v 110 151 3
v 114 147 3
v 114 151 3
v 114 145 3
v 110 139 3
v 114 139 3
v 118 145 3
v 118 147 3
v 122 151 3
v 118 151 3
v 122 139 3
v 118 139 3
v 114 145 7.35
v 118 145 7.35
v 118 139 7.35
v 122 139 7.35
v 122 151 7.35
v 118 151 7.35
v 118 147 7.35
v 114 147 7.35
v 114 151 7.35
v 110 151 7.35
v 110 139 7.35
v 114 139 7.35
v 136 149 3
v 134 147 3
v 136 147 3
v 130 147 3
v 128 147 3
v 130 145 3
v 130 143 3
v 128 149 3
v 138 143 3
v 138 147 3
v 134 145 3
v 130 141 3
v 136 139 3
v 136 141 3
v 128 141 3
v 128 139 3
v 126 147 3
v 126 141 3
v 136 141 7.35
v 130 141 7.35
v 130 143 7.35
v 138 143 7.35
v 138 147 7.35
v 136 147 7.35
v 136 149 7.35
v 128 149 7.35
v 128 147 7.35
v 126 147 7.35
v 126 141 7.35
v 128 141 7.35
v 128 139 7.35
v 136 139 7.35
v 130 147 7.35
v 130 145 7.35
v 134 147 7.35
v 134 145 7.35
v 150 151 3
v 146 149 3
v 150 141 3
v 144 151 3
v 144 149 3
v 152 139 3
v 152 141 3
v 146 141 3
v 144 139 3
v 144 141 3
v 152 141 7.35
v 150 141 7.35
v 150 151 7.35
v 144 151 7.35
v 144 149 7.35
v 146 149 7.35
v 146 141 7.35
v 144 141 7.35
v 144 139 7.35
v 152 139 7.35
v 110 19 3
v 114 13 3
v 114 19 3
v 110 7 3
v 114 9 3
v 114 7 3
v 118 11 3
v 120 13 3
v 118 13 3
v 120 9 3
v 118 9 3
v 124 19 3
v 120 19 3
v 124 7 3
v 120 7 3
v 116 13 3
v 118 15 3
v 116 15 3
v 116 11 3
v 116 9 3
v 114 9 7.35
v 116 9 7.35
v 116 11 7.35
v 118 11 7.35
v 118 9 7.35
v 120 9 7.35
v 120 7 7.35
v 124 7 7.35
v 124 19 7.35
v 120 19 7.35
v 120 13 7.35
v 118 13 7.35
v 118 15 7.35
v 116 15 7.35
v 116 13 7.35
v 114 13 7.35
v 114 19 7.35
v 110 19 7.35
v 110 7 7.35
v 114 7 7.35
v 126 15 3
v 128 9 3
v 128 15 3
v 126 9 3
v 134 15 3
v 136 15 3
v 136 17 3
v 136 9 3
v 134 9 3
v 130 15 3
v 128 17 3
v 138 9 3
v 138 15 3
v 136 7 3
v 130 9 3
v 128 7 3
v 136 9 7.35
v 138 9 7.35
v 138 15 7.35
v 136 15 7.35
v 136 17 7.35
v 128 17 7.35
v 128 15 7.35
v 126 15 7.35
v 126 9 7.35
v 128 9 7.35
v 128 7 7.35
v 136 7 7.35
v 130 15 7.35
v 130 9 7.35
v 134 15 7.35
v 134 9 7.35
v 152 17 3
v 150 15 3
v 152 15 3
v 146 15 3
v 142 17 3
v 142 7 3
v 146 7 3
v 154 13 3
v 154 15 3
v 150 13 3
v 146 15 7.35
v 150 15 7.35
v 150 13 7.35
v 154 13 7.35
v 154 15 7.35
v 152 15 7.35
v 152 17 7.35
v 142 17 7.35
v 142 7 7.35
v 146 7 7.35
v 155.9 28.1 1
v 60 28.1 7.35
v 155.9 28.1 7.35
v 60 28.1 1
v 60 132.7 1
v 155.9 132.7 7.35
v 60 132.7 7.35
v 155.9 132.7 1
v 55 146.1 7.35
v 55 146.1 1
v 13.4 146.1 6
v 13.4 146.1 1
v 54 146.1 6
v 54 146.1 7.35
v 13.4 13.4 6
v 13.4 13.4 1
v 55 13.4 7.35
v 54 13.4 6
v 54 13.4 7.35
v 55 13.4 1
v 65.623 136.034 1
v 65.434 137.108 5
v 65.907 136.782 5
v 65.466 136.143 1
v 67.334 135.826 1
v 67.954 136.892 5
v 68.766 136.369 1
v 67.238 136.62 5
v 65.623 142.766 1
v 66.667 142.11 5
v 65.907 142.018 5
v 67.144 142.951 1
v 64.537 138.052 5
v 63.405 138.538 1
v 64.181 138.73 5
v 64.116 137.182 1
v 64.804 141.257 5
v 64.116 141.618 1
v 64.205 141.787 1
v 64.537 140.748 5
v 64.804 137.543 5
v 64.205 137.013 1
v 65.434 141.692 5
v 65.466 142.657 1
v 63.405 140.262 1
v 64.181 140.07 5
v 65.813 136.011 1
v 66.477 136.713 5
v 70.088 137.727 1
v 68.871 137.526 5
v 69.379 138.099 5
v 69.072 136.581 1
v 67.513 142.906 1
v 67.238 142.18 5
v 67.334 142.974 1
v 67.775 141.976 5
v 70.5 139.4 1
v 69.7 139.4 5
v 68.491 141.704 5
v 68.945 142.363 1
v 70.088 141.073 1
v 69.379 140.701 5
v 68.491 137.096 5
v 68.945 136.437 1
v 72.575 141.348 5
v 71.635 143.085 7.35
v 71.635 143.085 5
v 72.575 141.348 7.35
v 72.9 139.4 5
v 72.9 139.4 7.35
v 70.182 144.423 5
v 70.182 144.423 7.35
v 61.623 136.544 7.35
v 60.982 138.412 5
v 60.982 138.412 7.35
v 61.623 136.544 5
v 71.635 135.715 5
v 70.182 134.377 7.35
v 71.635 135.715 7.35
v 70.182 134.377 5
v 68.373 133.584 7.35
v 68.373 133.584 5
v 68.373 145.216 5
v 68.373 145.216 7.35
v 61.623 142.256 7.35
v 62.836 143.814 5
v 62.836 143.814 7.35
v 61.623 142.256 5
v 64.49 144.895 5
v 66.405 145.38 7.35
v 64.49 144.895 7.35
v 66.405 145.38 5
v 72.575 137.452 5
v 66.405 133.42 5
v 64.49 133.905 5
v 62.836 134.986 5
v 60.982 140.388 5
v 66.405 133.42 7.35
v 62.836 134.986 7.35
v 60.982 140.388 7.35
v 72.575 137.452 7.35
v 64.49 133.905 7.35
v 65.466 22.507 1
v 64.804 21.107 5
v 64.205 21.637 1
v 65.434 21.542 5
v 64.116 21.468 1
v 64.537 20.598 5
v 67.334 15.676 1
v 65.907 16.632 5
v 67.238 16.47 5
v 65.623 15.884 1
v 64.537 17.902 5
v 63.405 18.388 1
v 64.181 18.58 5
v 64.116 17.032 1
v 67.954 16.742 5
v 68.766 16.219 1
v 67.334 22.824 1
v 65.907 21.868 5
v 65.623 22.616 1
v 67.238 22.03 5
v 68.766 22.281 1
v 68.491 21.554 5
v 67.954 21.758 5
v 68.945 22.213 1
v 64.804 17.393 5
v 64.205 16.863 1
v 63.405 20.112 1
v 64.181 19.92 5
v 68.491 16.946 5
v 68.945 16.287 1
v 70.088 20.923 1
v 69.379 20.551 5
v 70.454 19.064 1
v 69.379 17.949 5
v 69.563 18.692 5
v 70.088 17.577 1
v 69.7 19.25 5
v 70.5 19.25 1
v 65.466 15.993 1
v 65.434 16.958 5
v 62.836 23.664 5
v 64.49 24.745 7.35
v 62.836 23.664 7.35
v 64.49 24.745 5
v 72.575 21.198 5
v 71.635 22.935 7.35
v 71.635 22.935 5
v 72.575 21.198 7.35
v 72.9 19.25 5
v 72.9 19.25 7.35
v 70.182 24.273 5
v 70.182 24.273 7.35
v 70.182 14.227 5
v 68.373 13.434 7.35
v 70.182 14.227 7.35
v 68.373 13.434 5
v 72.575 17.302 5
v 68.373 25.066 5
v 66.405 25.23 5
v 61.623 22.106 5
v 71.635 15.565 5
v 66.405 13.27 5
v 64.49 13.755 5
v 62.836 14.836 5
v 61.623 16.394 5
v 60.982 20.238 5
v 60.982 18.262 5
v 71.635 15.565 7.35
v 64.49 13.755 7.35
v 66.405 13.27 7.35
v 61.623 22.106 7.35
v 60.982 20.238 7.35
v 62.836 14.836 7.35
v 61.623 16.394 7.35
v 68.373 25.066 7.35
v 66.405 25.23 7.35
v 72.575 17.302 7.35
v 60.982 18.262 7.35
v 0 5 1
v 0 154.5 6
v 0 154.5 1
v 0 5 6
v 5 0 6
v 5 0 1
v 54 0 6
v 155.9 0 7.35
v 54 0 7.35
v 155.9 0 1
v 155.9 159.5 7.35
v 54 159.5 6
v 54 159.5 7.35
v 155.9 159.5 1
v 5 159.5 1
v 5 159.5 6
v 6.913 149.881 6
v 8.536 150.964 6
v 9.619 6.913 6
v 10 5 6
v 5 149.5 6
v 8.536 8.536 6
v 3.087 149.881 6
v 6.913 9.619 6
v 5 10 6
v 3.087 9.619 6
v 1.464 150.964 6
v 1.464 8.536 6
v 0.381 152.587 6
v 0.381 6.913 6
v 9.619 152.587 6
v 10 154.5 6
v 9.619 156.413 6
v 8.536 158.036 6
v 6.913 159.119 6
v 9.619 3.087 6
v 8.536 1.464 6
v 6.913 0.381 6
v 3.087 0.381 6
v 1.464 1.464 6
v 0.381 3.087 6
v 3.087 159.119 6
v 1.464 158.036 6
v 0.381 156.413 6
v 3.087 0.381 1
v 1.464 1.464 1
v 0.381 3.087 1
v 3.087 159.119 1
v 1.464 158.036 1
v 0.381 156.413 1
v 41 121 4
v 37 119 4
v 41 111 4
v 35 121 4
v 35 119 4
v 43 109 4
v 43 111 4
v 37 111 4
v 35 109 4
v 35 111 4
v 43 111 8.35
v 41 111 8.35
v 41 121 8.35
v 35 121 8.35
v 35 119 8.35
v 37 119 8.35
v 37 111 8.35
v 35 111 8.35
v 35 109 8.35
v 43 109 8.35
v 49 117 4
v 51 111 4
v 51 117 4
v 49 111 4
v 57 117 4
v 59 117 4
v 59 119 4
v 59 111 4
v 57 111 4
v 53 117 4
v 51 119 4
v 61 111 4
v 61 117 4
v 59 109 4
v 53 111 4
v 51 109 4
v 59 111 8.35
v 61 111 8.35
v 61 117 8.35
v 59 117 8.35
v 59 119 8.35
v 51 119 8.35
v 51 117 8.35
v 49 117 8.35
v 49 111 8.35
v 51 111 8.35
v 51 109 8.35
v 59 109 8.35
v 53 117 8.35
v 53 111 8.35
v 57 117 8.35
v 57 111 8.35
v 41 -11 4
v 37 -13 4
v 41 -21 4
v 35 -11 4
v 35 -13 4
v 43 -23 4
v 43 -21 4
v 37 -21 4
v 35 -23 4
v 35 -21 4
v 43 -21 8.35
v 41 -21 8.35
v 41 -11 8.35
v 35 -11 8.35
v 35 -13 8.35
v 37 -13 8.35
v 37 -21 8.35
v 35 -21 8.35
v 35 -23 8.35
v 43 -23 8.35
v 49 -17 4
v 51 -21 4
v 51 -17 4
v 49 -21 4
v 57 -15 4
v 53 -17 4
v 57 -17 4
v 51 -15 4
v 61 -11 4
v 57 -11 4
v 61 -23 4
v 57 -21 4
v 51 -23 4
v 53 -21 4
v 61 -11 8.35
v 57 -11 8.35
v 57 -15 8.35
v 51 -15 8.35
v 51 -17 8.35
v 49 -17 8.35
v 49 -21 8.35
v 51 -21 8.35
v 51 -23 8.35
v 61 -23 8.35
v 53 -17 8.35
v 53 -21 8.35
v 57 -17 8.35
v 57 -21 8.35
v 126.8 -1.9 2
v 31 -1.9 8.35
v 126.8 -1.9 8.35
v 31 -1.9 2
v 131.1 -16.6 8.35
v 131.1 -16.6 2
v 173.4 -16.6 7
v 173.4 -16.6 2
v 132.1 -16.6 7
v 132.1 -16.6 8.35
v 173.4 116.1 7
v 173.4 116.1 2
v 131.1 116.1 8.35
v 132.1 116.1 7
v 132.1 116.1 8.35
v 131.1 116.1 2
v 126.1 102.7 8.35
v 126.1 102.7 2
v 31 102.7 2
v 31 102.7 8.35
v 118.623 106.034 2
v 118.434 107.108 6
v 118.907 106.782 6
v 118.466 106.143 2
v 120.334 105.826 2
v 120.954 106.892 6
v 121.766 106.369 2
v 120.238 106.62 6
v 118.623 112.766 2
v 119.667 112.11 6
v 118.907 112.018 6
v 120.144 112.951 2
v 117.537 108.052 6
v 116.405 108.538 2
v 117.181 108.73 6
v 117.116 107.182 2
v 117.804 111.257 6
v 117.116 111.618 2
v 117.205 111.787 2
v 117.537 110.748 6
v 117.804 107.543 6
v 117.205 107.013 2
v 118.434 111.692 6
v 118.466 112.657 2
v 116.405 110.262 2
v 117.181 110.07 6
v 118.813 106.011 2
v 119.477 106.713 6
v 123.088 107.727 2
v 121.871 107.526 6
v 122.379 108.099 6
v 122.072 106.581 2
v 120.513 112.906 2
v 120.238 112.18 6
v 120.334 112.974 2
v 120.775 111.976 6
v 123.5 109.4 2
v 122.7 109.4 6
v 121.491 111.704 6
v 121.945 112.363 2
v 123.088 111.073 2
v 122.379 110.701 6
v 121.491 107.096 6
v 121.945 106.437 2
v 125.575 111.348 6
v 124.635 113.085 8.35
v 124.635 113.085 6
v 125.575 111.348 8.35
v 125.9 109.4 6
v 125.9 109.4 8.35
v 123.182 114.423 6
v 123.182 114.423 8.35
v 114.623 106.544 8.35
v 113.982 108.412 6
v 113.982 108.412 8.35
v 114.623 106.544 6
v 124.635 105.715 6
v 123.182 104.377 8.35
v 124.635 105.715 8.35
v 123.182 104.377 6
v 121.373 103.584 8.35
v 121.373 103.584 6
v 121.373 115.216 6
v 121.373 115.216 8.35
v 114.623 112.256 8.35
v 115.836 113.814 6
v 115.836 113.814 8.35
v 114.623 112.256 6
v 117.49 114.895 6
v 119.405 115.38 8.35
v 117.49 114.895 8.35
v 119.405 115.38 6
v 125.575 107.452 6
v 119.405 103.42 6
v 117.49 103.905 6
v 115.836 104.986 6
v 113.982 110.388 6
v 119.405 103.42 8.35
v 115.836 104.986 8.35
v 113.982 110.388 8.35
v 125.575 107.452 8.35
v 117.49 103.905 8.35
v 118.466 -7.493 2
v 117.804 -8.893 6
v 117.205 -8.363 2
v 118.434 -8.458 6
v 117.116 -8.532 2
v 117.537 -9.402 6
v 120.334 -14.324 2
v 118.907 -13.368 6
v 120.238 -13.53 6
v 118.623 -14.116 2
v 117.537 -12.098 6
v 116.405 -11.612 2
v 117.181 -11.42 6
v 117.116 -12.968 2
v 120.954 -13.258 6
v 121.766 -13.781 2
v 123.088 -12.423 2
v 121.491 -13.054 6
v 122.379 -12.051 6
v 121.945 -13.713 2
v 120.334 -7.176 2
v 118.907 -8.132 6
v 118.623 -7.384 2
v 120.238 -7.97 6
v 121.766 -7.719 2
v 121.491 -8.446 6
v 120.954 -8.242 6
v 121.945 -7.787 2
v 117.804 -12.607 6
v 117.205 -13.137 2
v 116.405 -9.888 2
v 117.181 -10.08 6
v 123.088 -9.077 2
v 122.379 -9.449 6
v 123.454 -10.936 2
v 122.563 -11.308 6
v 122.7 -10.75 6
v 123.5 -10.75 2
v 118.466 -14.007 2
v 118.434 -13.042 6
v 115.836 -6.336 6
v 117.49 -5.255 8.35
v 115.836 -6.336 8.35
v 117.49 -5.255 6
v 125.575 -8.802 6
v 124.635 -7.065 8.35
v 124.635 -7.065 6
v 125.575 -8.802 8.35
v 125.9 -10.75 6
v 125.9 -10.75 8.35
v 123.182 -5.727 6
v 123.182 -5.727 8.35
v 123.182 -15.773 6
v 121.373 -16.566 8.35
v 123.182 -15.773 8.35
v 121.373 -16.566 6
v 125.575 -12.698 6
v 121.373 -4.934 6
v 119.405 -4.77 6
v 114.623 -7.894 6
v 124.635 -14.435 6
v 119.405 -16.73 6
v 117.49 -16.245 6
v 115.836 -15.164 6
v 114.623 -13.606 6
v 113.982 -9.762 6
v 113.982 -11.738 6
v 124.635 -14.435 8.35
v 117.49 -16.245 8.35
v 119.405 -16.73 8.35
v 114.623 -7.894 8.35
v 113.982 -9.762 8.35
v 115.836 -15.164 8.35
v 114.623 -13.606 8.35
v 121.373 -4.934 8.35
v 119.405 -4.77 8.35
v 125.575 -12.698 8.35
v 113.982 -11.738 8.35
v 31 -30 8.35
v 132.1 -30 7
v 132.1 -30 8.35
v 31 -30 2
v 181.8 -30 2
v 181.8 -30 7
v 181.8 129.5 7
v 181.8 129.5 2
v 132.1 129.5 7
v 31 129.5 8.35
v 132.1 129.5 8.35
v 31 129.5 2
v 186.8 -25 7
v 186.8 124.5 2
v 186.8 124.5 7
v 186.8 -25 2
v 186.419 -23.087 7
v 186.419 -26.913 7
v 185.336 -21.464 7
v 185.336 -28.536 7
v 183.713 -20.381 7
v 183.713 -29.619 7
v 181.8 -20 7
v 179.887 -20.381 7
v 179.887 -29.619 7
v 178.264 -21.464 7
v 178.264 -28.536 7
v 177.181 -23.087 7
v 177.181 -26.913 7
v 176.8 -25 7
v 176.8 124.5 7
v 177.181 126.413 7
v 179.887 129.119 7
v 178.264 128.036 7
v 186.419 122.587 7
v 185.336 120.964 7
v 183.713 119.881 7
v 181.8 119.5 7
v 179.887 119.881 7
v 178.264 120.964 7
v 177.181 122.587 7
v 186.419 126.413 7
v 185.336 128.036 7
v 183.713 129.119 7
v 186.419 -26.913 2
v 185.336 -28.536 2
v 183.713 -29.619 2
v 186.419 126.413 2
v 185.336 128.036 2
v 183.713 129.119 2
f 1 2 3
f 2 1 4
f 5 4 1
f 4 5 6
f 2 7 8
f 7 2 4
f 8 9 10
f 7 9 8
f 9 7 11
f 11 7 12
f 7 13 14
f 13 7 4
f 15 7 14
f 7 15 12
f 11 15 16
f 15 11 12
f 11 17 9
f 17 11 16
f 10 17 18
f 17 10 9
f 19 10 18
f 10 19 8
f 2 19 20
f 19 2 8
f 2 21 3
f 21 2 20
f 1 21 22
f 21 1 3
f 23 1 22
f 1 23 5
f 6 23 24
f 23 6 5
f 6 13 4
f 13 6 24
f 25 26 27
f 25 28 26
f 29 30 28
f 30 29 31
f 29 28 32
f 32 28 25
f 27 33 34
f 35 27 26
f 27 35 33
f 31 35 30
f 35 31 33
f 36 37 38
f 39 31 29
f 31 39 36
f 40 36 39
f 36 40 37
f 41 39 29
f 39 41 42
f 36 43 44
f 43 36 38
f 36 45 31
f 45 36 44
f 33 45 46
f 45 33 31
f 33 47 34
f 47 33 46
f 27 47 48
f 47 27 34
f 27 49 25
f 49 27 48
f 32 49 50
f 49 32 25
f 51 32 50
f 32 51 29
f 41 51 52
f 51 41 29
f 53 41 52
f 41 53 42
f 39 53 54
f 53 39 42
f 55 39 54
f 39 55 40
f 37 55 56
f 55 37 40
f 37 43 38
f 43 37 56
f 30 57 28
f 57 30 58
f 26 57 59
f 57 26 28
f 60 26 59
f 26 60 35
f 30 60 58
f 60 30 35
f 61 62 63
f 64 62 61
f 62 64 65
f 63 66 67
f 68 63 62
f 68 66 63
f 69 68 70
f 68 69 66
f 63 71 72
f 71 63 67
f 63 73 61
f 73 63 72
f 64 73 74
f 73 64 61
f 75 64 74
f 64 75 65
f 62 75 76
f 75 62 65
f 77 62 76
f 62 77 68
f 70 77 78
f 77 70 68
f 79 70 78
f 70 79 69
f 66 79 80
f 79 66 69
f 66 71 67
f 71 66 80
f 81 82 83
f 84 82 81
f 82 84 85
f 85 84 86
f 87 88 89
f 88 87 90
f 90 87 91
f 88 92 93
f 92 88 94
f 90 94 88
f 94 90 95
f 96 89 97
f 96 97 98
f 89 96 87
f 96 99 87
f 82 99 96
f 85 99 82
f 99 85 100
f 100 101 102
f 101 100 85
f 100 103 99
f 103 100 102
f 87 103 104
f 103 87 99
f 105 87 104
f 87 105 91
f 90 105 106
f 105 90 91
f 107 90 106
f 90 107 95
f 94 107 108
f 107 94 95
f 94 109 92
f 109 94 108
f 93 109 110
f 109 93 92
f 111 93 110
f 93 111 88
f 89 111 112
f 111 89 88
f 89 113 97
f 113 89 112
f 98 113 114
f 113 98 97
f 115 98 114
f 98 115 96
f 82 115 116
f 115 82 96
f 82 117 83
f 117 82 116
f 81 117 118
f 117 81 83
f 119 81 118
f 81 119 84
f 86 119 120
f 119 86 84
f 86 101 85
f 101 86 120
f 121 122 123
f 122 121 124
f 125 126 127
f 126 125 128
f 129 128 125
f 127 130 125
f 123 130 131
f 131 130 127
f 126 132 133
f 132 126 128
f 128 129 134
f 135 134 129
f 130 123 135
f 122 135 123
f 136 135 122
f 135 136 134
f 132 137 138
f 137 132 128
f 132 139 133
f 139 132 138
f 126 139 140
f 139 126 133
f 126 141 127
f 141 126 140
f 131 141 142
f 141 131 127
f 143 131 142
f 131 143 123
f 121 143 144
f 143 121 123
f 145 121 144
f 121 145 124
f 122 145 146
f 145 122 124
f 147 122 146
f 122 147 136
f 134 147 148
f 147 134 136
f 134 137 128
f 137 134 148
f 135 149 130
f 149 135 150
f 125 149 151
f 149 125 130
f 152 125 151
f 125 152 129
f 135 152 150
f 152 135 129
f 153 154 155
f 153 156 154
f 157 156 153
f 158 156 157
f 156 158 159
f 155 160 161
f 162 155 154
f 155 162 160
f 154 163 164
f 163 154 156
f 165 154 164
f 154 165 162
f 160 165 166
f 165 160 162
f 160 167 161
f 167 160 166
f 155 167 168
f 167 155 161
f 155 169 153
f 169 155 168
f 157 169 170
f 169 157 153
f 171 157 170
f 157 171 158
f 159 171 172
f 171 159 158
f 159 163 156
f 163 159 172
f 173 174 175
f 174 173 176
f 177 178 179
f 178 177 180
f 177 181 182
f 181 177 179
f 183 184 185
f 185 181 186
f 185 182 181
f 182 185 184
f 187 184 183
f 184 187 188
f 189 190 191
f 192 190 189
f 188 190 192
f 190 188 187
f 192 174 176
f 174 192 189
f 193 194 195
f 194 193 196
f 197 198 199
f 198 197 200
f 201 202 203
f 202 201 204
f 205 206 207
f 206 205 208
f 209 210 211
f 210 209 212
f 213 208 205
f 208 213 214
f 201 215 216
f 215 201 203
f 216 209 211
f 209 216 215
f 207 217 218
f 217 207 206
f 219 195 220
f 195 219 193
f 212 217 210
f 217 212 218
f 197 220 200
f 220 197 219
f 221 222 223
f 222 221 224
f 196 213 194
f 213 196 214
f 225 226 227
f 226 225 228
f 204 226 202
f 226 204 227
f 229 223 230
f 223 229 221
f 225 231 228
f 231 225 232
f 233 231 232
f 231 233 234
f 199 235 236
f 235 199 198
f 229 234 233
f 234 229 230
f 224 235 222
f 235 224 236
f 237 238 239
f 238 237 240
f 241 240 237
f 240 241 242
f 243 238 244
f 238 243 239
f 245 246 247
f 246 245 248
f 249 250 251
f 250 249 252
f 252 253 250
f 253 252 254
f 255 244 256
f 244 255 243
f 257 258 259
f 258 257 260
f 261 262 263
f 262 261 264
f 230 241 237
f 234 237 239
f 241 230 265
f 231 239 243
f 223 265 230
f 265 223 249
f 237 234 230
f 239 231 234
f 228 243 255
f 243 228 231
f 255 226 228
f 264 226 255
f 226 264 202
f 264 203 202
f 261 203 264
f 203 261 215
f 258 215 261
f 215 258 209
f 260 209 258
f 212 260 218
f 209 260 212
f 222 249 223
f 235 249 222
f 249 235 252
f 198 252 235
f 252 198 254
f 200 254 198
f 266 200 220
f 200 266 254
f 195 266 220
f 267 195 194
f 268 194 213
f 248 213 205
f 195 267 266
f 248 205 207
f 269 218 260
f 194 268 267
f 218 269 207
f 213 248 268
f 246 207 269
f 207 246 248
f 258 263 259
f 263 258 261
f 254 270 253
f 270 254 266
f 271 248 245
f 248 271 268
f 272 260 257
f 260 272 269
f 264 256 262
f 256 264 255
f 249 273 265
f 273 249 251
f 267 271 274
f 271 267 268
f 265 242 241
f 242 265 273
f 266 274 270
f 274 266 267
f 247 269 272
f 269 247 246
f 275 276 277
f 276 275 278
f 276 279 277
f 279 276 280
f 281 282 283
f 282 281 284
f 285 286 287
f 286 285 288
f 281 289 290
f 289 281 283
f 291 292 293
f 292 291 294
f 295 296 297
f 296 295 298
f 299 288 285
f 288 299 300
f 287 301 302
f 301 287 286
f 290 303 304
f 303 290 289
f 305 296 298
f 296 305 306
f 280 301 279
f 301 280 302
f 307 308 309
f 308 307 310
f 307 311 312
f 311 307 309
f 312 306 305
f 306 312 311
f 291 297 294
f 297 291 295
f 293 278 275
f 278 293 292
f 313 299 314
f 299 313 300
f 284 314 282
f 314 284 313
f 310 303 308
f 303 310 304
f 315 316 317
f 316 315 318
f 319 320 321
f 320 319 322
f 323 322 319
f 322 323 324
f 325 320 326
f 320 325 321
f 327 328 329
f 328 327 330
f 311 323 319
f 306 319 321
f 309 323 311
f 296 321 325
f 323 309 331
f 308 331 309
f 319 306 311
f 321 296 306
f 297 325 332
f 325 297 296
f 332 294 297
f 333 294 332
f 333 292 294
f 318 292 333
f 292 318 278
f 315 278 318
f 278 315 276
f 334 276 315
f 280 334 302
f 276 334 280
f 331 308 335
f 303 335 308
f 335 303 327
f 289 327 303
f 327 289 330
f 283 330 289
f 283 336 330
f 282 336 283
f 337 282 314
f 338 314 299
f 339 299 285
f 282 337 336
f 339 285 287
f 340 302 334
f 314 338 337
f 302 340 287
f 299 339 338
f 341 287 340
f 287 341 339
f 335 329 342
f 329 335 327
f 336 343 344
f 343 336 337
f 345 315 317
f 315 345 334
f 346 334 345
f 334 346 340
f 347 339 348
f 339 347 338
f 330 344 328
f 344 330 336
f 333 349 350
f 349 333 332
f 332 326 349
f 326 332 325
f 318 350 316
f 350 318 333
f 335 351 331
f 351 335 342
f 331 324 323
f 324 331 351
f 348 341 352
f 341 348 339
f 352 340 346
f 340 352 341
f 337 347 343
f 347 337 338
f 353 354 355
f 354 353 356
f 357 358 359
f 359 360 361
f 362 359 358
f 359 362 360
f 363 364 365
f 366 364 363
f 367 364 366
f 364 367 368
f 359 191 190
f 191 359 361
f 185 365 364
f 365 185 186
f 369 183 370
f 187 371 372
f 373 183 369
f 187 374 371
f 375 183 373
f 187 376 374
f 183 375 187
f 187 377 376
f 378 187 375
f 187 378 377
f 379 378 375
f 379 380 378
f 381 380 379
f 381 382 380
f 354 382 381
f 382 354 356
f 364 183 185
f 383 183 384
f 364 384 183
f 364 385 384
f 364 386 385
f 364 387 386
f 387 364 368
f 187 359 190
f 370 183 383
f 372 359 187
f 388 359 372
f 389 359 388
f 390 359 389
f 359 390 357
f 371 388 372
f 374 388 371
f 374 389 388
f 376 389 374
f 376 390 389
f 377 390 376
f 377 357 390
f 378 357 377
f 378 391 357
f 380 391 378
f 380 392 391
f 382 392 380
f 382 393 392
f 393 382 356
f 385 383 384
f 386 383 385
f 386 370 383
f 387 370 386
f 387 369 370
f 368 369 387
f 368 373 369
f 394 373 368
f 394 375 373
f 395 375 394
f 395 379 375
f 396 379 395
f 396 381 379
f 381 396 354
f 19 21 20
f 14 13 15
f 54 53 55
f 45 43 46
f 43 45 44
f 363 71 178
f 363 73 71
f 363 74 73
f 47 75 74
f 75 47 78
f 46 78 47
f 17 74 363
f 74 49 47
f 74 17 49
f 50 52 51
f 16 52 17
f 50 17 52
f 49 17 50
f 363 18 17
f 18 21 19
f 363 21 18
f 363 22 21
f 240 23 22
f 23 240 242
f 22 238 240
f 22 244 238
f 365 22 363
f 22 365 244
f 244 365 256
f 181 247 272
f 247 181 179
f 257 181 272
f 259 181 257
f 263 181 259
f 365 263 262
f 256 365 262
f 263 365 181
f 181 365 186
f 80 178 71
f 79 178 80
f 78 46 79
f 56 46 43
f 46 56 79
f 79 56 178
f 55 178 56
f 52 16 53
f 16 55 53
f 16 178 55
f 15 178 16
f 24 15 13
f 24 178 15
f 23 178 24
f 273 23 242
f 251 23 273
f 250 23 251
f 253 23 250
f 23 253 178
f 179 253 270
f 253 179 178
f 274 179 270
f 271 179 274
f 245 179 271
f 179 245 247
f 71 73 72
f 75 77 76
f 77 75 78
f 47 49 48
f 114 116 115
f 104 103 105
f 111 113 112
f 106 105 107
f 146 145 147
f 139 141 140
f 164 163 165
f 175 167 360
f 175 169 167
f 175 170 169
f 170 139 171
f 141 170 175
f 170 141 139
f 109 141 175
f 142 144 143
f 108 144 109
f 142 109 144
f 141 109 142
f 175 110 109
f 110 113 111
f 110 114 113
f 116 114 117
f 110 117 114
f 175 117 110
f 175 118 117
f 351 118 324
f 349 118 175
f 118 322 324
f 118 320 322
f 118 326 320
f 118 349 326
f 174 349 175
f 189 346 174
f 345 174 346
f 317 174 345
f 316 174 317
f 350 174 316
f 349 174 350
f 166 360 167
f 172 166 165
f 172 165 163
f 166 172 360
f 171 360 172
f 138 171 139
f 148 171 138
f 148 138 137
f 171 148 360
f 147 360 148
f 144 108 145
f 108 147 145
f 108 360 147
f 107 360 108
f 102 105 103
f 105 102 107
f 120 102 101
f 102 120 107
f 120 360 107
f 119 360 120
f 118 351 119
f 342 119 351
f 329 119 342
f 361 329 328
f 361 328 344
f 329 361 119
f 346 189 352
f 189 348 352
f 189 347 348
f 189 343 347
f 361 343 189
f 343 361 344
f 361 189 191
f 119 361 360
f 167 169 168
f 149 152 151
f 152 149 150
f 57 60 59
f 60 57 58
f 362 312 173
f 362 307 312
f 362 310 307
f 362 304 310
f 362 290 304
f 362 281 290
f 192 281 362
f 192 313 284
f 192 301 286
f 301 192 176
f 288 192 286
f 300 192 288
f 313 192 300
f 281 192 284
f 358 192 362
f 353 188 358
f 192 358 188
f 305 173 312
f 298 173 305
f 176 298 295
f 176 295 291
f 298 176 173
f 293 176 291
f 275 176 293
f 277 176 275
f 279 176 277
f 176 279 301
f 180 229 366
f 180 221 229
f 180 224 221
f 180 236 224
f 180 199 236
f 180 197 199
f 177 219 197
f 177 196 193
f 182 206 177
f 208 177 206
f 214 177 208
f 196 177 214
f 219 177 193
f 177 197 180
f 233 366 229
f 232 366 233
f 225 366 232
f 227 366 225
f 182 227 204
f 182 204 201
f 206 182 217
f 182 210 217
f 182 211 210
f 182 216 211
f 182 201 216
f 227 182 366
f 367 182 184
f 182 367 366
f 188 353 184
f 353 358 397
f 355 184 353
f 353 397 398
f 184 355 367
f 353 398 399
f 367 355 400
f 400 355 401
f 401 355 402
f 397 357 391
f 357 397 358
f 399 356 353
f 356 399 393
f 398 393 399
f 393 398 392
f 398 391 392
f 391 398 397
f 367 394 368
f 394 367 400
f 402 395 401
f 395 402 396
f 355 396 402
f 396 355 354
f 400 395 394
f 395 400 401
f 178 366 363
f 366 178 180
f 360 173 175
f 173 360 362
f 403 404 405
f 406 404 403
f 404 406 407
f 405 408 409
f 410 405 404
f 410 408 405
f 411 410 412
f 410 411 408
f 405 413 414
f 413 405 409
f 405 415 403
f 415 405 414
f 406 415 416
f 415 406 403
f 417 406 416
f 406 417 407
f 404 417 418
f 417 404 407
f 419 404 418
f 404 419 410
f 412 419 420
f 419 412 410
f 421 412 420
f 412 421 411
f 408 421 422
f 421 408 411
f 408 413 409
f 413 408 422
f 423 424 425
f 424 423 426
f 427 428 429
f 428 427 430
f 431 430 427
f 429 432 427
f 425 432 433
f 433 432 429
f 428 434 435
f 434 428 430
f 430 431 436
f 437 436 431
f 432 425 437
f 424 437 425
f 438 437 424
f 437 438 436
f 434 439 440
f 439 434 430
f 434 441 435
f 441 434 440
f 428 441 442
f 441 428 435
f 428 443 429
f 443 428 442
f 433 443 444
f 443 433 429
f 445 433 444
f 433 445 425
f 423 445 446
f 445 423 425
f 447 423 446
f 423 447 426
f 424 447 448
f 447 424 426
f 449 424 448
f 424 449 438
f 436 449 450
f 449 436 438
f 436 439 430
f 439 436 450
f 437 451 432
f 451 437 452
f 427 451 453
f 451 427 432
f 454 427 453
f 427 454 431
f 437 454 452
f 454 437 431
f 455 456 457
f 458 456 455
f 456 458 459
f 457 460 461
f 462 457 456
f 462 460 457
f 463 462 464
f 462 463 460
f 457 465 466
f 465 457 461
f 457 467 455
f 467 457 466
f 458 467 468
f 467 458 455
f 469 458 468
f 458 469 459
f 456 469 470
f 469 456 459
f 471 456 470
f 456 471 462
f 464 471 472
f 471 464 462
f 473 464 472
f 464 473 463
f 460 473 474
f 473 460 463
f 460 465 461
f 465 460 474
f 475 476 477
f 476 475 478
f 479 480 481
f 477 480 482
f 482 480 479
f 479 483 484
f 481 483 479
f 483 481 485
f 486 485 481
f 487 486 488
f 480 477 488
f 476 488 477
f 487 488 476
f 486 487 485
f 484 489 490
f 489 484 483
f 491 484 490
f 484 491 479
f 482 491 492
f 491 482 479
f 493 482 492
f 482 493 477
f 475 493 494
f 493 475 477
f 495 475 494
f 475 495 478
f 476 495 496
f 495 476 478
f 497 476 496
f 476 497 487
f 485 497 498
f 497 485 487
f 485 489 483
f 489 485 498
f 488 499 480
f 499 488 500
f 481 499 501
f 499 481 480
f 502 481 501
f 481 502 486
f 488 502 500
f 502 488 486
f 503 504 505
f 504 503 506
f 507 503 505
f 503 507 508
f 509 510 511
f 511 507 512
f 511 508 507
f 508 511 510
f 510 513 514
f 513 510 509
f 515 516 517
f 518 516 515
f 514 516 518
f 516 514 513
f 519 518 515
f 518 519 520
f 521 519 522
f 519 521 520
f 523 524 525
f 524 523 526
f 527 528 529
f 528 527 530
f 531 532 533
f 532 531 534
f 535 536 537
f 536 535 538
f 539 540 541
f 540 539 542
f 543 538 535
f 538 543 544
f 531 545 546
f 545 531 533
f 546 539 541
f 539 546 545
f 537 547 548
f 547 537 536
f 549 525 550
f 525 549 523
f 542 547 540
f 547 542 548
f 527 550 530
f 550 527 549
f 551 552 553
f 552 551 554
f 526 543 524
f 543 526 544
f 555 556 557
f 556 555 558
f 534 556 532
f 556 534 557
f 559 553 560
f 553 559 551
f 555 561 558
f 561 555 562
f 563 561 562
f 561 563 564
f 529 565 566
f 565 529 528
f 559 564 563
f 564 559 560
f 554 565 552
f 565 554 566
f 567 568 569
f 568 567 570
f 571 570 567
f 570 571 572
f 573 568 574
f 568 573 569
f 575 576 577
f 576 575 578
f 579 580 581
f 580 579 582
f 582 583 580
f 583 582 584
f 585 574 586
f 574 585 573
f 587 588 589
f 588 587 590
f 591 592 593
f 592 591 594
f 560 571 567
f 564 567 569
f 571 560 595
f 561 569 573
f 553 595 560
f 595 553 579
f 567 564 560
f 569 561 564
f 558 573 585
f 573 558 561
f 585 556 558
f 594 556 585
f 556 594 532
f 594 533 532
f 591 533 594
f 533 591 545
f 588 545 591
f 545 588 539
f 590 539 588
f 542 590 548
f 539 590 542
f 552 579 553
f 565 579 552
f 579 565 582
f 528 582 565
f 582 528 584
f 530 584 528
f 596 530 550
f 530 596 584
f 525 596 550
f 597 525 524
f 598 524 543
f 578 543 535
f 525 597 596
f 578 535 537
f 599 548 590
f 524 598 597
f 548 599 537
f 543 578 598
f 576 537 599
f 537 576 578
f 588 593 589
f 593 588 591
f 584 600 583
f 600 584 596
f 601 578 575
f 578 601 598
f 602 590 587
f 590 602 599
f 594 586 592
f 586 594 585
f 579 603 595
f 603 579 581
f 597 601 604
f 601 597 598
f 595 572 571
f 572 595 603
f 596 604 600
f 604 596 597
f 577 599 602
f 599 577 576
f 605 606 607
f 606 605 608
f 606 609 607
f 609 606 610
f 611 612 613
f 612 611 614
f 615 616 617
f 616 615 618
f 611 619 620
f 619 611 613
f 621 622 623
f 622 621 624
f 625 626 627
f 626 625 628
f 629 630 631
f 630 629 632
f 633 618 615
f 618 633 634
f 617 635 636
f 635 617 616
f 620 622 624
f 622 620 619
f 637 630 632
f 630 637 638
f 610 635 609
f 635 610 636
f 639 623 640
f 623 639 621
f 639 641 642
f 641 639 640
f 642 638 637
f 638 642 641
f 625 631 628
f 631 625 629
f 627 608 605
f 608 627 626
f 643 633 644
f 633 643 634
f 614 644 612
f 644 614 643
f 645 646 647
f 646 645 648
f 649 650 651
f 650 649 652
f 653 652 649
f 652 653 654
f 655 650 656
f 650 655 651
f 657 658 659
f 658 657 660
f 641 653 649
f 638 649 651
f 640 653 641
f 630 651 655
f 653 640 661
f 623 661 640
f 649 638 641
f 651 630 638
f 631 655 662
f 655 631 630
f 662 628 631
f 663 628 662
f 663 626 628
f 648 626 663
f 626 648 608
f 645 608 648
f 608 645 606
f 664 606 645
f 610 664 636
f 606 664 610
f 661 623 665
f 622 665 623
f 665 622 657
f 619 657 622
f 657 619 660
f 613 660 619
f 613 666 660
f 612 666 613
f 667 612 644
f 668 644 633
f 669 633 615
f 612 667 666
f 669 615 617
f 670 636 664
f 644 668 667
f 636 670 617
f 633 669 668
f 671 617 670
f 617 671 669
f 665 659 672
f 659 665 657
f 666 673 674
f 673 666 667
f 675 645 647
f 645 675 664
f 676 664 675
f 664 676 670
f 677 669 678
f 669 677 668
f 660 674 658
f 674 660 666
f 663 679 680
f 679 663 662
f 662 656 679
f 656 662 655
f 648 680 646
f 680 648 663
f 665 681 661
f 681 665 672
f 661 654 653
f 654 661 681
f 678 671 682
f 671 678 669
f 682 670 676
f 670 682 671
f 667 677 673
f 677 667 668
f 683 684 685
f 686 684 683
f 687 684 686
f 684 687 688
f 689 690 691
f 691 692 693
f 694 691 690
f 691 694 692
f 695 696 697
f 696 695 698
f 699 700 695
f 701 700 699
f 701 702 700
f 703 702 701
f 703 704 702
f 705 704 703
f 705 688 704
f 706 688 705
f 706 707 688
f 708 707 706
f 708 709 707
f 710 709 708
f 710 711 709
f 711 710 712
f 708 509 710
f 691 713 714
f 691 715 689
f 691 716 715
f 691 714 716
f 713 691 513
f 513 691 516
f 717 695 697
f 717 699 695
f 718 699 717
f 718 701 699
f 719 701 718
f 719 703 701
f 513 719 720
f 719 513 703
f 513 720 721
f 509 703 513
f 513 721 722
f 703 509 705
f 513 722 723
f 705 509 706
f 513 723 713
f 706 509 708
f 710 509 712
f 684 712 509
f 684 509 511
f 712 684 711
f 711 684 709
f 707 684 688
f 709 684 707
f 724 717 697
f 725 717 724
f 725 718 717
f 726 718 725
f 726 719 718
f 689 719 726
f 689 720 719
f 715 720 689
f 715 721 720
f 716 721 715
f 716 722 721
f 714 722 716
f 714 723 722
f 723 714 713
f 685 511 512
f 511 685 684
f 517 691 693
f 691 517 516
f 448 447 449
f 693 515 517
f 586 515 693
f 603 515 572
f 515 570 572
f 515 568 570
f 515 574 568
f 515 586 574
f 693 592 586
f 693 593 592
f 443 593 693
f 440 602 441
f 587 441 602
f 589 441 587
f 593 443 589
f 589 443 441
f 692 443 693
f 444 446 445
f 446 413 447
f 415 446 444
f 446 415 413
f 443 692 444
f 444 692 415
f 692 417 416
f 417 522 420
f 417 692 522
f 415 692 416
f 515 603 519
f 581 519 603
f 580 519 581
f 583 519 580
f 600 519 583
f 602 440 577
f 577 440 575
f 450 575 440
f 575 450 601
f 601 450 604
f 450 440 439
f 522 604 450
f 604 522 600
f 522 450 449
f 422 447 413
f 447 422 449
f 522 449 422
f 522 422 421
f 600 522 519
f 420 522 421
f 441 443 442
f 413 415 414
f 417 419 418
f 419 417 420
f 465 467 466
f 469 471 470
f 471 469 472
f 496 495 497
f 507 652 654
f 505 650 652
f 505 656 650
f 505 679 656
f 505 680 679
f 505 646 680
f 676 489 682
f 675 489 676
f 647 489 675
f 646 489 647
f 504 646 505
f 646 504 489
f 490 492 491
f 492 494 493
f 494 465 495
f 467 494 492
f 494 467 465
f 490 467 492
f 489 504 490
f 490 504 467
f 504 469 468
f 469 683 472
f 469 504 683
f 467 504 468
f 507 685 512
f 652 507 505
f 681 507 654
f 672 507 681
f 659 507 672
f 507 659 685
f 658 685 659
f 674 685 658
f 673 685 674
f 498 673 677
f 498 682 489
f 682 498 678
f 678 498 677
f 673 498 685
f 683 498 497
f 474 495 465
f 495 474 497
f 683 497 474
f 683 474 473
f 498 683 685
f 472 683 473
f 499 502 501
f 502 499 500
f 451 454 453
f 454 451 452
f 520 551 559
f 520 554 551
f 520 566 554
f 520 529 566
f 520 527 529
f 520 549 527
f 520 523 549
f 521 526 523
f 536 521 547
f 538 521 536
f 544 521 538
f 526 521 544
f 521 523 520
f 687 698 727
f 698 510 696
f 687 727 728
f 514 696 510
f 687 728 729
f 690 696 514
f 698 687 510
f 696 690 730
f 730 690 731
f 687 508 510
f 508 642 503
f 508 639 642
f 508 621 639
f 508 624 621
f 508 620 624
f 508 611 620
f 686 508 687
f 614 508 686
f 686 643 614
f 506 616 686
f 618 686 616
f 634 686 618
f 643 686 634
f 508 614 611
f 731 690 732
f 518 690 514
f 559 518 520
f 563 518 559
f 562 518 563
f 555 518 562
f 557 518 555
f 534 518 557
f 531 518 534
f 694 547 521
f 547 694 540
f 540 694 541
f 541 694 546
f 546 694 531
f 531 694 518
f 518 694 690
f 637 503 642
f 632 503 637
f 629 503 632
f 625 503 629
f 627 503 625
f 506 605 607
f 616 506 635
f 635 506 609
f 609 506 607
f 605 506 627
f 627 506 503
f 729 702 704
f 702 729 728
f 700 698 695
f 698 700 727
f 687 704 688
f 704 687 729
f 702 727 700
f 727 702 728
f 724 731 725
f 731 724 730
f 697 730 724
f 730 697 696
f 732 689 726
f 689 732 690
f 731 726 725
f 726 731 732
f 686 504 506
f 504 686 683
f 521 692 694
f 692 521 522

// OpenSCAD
include <MCAD/shapes.scad>
use <MCAD/fonts.scad>

//Choose what font you want
thisFont=8bit_polyfont();

x_shift=thisFont[0][0];
y_shift=thisFont[0][1];

// preview[view:south, tilt:top]

//Choose between full size 12in X 6in (311.8) or split (155.9) to fit build platform.
plate=155.9;//[155.9,311.8]

//Change font to fit text in space
font_scale=2;//[1,1.5,2,2.5,3]

//1 goes all the way through, 8 leaves blank
text_depth=3;//[1,2,3,4,5,6,7,8]


//This is the text for the top // Use spaces in front of word to center
top_word="   Hello";

//This is the text for the bottom // Use spaces in front of word to center
bottom_word="   World";


module license_plate_trim();
{
	difference()
	{
		union()
		{
			difference()
			{
				translate([0,0,1])scale([311.8,159.5,6.35])cube(1);
					union()
					{
						linear_extrude(height=10)translate([0,0,-5])polygon(points=[[13.4,13.4],[55,13.4],[60,28.1],[251.8,28.1],[256.1,13.4],[298.4,13.4],[298.4,146.1],[256.1,146.1],[256.1,146.1],[251.1,132.7],[60,132.7],[55,146.1],[13.4,146.1]],paths=[[0,1,2,3,4,5,6,7,8,9,10,11,12]]);
						translate([66.9,139.4,-1])cylinder(10,4,2);
						translate([66.9,139.4,5])cylinder(5,6,6);
						translate([244.9,139.4,-1])cylinder(10,4,2);
						translate([244.9,139.4,5])cylinder(5,6,6);
						translate([66.9,19.25,-1])cylinder(10,4,2);
						translate([66.9,19.25,5])cylinder(5,6,6);
						translate([244.9,19.25,-1])cylinder(10,4,2);
						translate([244.9,19.25,5])cylinder(5,6,6);
						cube([5,5,10]);
						translate([0,154.5,0])cube([5,5,10]);
						translate([306.8,154.5,0])cube([5,5,10]);
						translate([306.8,0,0])cube([5,5,10]);
						translate([-1,-1,6])cube([55,165,3]);
						translate([257.1,-1,6])cube([55,165,3]);
						translate([60,145,text_depth-2])License_Top_Label();
						translate([60,13,text_depth-2])License_Bottom_Label();
					}
			}
		translate([5,5,1])cylinder(5,5,5);
		translate([5,154.5,1])cylinder(5,5,5);
		translate([306.8,5,1])cylinder(5,5,5);
		translate([306.8,154.5,1])cylinder(5,5,5);
	
		}
translate([plate,-10,0])scale([400,200,20])cube(1);
}
}


module License_Bottom_Label()
	{
	theseIndicies=search(bottom_word,thisFont[2],1,1);
	difference() 
		{
		union() 
			{
				scale([font_scale,font_scale,2])
					{
						for(i=[0:(len(theseIndicies)-1)] ) 
							translate([i*x_shift, -y_shift/2 ,1]) 
						{
							linear_extrude(height=4) polygon(points=thisFont[2][theseIndicies[i]][6][0],paths=thisFont[2][theseIndicies[i]][6][1]);
						}
					}
			}
		}
	}

module License_Top_Label()
	{

	theseIndicies=search(top_word,thisFont[2],1,1);
	difference() 
		{
		union() 
			{
				scale([font_scale,font_scale,2])
					{
						for(i=[0:(len(theseIndicies)-1)] ) 
							translate([ i*x_shift, -y_shift/2 ,1]) 
						{
							linear_extrude(height=4) polygon(points=thisFont[2][theseIndicies[i]][6][0],paths=thisFont[2][theseIndicies[i]][6][1]);

						}
					}
			}
		}
	}
module right_half_license_plate_trim();
{
	difference()
	{
		union()
		{
			translate([-125,-30,1])difference()
			{
				translate([0,0,1])scale([311.8,159.5,6.35])cube(1);
					union()
					{
						linear_extrude(height=10)translate([0,0,-5])polygon(points=[[13.4,13.4],[55,13.4],[60,28.1],[251.8,28.1],[256.1,13.4],[298.4,13.4],[298.4,146.1],[256.1,146.1],[256.1,146.1],[251.1,132.7],[60,132.7],[55,146.1],[13.4,146.1]],paths=[[0,1,2,3,4,5,6,7,8,9,10,11,12]]);
						translate([66.9,139.4,-1])cylinder(10,4,2);
						translate([66.9,139.4,5])cylinder(5,6,6);
						translate([244.9,139.4,-1])cylinder(10,4,2);
						translate([244.9,139.4,5])cylinder(5,6,6);
						translate([66.9,19.25,-1])cylinder(10,4,2);
						translate([66.9,19.25,5])cylinder(5,6,6);
						translate([244.9,19.25,-1])cylinder(10,4,2);
						translate([244.9,19.25,5])cylinder(5,6,6);
						cube([5,5,10]);
						translate([0,154.5,0])cube([5,5,10]);
						translate([306.8,154.5,0])cube([5,5,10]);
						translate([306.8,0,0])cube([5,5,10]);
						translate([-1,-1,6])cube([55,165,3]);
						translate([257.1,-1,6])cube([55,165,3]);
						translate([60,145,text_depth-2])License_Top_Label();
						translate([60,13,text_depth-2])License_Bottom_Label();
					}
			}
			translate([-125,-30,1])union()
			{
				translate([306.8,5,1])cylinder(5,5,5);
				translate([306.8,154.5,1])cylinder(5,5,5);
				translate([5,5,1])cylinder(5,5,5);
				translate([5,154.5,1])cylinder(5,5,5);
			}
		}
		
	translate([plate-436.9,-40,0])scale([312,200,20])cube(1);
	}
}
